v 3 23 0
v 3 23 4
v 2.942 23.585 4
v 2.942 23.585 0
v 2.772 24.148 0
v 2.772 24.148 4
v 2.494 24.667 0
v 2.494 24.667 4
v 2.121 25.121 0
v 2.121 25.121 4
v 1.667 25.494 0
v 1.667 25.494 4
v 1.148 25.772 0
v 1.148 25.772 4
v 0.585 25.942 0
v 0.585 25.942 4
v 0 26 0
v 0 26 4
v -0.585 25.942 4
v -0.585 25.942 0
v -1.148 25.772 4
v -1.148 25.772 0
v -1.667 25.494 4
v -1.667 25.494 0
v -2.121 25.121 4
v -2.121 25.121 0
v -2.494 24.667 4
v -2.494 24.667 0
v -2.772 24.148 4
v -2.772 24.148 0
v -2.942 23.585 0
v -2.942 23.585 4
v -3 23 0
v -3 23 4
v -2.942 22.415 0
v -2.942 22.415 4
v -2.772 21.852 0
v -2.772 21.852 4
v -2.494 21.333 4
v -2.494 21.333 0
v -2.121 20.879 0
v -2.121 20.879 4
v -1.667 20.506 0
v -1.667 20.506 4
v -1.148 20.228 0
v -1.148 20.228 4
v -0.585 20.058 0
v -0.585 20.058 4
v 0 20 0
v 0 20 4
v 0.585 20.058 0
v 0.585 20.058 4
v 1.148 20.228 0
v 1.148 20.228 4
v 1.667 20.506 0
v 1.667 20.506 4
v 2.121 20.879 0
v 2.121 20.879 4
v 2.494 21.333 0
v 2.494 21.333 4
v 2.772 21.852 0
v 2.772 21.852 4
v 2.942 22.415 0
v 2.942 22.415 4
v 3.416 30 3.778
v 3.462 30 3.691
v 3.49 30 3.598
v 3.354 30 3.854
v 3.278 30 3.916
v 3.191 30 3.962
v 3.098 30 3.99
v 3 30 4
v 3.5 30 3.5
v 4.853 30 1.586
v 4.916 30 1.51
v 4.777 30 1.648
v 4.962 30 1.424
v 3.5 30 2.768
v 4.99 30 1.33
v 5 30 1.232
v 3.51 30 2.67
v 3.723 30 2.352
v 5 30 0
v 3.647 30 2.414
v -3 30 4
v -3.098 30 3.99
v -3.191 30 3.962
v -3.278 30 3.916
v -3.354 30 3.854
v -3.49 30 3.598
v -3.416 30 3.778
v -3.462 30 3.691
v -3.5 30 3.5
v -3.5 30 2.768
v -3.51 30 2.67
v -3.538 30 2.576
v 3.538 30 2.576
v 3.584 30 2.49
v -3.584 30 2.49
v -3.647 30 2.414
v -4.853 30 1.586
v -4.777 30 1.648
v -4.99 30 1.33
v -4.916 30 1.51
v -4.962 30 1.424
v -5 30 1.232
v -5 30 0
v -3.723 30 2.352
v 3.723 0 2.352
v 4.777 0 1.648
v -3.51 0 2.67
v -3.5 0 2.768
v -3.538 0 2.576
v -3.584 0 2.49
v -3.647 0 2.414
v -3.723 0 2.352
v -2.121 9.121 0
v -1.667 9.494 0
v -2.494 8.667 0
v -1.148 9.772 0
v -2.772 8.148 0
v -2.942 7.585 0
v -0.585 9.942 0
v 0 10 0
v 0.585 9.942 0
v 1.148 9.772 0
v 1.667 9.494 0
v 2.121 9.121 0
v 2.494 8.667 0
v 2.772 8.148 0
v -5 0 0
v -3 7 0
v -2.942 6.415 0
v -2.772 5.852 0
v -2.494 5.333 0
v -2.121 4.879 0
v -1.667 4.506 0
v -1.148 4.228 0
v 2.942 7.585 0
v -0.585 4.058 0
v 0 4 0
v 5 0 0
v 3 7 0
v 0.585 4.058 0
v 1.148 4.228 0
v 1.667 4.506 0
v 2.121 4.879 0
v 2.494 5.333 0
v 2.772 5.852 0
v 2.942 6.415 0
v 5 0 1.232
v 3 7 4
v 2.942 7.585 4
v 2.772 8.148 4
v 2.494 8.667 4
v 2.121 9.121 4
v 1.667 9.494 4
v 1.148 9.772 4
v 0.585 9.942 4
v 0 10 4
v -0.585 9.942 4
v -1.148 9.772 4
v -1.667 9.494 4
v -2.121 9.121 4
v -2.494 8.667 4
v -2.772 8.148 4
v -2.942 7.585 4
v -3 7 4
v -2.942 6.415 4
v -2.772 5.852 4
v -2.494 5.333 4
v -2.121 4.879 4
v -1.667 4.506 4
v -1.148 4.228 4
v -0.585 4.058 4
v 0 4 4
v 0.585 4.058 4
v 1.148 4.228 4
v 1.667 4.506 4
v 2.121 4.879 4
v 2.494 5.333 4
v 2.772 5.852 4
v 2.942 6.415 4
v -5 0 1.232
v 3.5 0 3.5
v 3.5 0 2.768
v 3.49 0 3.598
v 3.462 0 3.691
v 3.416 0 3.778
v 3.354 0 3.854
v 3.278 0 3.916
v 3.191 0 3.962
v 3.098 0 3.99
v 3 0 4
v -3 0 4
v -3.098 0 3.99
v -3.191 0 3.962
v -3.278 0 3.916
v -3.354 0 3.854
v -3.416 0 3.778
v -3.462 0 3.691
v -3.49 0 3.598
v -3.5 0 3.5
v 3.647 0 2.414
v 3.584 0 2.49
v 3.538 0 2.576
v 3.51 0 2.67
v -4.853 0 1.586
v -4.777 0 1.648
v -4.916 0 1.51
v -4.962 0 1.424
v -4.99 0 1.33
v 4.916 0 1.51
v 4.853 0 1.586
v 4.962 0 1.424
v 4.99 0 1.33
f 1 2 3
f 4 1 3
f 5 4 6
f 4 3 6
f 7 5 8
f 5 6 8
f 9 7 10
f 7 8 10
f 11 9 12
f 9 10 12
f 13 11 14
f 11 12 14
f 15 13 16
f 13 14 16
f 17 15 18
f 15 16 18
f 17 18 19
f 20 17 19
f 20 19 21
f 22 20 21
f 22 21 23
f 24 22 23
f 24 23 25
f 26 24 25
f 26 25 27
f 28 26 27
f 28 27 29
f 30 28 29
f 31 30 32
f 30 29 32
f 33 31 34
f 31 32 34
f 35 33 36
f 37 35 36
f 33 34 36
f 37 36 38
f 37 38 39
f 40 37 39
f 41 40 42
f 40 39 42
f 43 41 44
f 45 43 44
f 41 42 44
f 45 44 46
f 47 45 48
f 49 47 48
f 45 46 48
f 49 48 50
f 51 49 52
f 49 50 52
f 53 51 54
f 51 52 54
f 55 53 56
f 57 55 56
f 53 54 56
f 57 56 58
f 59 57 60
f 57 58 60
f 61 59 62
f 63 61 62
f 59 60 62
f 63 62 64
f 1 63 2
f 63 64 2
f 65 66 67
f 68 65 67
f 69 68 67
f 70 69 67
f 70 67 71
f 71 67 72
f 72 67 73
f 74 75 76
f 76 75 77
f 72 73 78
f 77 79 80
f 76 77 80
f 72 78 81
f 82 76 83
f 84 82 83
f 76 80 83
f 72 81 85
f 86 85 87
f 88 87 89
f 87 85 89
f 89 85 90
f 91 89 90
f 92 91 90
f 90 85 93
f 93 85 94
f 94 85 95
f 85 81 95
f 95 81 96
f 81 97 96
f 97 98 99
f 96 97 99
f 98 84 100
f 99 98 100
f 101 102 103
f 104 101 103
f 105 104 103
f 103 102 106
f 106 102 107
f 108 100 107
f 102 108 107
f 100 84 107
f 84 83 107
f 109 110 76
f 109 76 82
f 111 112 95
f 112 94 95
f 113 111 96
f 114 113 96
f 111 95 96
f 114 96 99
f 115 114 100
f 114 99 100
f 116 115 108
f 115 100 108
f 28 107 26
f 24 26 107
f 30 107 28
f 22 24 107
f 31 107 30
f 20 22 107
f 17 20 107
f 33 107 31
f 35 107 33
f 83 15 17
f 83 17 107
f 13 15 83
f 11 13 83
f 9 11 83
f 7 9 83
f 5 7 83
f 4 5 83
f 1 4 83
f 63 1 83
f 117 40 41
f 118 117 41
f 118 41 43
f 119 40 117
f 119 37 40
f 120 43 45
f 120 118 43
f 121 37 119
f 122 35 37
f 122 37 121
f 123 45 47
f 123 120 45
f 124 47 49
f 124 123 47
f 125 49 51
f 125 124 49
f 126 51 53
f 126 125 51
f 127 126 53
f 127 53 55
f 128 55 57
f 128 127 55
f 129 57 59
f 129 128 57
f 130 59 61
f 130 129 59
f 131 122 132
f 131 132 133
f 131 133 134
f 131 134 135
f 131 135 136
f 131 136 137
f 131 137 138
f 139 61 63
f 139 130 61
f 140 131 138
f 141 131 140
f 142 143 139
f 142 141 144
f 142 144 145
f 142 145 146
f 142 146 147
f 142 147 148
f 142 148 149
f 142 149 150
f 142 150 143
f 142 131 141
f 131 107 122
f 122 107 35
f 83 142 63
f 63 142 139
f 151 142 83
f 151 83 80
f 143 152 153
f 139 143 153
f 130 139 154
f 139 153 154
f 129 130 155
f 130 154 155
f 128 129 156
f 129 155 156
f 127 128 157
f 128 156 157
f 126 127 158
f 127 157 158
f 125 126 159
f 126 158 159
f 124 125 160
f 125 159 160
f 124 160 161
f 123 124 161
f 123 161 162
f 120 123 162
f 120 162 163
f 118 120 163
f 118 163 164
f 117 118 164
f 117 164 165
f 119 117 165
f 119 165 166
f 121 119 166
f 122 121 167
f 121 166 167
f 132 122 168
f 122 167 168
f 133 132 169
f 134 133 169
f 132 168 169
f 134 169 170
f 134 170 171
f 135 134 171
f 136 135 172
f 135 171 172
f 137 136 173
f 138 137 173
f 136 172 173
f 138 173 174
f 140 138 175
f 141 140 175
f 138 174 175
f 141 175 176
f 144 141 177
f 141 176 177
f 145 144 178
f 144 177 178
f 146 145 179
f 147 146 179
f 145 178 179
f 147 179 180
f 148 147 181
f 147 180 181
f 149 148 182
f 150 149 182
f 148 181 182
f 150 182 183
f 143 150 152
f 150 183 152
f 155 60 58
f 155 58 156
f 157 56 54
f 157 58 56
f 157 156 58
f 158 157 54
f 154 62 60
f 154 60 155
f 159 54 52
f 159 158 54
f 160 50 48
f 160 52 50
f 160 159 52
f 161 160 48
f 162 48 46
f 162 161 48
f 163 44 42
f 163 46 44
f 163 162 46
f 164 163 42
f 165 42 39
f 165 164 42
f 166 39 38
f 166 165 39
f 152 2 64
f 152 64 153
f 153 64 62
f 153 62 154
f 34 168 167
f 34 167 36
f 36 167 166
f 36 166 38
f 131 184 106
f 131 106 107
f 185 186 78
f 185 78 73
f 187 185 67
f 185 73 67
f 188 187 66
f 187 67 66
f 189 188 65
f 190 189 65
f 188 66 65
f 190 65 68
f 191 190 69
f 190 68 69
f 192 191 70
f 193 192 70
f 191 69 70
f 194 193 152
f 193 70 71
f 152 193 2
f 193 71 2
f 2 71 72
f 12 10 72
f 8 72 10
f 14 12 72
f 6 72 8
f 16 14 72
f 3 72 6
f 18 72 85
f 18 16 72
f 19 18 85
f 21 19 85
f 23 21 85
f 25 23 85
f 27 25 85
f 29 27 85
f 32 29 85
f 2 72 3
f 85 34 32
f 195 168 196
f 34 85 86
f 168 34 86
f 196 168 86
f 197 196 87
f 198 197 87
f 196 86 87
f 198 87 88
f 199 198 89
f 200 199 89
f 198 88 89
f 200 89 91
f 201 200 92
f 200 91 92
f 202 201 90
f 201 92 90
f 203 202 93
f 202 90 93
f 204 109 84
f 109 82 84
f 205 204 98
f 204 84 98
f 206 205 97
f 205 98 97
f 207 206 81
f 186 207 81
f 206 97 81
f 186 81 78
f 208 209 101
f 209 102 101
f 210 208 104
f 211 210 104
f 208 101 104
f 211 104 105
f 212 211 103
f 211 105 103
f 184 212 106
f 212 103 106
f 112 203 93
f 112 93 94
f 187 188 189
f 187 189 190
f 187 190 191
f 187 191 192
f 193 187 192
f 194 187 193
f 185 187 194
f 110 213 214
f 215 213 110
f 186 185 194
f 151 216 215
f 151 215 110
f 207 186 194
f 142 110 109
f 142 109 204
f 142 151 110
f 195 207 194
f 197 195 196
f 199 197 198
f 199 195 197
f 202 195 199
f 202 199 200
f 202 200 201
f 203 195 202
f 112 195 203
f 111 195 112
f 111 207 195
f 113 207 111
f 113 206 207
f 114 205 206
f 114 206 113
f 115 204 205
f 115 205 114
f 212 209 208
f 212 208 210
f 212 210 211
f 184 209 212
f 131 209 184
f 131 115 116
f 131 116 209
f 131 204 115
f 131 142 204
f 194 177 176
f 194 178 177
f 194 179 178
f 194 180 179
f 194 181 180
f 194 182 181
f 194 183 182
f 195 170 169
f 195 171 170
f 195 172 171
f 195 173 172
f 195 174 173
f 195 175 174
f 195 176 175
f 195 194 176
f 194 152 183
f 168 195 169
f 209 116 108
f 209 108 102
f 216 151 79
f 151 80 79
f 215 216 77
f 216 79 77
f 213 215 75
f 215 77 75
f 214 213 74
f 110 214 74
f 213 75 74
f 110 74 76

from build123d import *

# Parameters (mm, degrees)
EXTRUDE_1_DEPTH     = 30
FILLET_1_R          = 0.5
SKETCH_2_R          = 3
CUT_EXTRUDE_1_DEPTH = 30


with BuildPart() as part:
    # Эскиз1 → Бобышка-Вытянуть1 (new body)
    with BuildSketch(Plane(origin=(0, 0, 0), x_dir=(1, 0, 0), z_dir=(0, 1, 0))):
        Polygon((-5, 0), (5, 0), (5, -1.5), (3.5, -2.5), (3.5, -4), (-3.5, -4), (-3.5, -2.5), (-5, -1.5), align=None)
    extrude(amount=EXTRUDE_1_DEPTH)

    # Скругление1
    fillet_1_edges = [part.edges().sort_by_distance(p)[0] for p in [
        (5, 15, 1.5),
        (3.5, 15, 2.5),
        (3.5, 15, 4),
        (-3.5, 15, 4),
        (-3.5, 15, 2.5),
        (-5, 15, 1.5),
    ]]
    fillet(fillet_1_edges, radius=FILLET_1_R)

    # Эскиз2 → Вырез-Вытянуть1 (cut)
    with BuildSketch(Plane.XY.offset(4)):
        with Locations((0, 23)):
            Circle(SKETCH_2_R)
        with Locations((0, 7)):
            Circle(SKETCH_2_R)
    extrude(amount=-CUT_EXTRUDE_1_DEPTH, mode=Mode.SUBTRACT)


solid = part.part
